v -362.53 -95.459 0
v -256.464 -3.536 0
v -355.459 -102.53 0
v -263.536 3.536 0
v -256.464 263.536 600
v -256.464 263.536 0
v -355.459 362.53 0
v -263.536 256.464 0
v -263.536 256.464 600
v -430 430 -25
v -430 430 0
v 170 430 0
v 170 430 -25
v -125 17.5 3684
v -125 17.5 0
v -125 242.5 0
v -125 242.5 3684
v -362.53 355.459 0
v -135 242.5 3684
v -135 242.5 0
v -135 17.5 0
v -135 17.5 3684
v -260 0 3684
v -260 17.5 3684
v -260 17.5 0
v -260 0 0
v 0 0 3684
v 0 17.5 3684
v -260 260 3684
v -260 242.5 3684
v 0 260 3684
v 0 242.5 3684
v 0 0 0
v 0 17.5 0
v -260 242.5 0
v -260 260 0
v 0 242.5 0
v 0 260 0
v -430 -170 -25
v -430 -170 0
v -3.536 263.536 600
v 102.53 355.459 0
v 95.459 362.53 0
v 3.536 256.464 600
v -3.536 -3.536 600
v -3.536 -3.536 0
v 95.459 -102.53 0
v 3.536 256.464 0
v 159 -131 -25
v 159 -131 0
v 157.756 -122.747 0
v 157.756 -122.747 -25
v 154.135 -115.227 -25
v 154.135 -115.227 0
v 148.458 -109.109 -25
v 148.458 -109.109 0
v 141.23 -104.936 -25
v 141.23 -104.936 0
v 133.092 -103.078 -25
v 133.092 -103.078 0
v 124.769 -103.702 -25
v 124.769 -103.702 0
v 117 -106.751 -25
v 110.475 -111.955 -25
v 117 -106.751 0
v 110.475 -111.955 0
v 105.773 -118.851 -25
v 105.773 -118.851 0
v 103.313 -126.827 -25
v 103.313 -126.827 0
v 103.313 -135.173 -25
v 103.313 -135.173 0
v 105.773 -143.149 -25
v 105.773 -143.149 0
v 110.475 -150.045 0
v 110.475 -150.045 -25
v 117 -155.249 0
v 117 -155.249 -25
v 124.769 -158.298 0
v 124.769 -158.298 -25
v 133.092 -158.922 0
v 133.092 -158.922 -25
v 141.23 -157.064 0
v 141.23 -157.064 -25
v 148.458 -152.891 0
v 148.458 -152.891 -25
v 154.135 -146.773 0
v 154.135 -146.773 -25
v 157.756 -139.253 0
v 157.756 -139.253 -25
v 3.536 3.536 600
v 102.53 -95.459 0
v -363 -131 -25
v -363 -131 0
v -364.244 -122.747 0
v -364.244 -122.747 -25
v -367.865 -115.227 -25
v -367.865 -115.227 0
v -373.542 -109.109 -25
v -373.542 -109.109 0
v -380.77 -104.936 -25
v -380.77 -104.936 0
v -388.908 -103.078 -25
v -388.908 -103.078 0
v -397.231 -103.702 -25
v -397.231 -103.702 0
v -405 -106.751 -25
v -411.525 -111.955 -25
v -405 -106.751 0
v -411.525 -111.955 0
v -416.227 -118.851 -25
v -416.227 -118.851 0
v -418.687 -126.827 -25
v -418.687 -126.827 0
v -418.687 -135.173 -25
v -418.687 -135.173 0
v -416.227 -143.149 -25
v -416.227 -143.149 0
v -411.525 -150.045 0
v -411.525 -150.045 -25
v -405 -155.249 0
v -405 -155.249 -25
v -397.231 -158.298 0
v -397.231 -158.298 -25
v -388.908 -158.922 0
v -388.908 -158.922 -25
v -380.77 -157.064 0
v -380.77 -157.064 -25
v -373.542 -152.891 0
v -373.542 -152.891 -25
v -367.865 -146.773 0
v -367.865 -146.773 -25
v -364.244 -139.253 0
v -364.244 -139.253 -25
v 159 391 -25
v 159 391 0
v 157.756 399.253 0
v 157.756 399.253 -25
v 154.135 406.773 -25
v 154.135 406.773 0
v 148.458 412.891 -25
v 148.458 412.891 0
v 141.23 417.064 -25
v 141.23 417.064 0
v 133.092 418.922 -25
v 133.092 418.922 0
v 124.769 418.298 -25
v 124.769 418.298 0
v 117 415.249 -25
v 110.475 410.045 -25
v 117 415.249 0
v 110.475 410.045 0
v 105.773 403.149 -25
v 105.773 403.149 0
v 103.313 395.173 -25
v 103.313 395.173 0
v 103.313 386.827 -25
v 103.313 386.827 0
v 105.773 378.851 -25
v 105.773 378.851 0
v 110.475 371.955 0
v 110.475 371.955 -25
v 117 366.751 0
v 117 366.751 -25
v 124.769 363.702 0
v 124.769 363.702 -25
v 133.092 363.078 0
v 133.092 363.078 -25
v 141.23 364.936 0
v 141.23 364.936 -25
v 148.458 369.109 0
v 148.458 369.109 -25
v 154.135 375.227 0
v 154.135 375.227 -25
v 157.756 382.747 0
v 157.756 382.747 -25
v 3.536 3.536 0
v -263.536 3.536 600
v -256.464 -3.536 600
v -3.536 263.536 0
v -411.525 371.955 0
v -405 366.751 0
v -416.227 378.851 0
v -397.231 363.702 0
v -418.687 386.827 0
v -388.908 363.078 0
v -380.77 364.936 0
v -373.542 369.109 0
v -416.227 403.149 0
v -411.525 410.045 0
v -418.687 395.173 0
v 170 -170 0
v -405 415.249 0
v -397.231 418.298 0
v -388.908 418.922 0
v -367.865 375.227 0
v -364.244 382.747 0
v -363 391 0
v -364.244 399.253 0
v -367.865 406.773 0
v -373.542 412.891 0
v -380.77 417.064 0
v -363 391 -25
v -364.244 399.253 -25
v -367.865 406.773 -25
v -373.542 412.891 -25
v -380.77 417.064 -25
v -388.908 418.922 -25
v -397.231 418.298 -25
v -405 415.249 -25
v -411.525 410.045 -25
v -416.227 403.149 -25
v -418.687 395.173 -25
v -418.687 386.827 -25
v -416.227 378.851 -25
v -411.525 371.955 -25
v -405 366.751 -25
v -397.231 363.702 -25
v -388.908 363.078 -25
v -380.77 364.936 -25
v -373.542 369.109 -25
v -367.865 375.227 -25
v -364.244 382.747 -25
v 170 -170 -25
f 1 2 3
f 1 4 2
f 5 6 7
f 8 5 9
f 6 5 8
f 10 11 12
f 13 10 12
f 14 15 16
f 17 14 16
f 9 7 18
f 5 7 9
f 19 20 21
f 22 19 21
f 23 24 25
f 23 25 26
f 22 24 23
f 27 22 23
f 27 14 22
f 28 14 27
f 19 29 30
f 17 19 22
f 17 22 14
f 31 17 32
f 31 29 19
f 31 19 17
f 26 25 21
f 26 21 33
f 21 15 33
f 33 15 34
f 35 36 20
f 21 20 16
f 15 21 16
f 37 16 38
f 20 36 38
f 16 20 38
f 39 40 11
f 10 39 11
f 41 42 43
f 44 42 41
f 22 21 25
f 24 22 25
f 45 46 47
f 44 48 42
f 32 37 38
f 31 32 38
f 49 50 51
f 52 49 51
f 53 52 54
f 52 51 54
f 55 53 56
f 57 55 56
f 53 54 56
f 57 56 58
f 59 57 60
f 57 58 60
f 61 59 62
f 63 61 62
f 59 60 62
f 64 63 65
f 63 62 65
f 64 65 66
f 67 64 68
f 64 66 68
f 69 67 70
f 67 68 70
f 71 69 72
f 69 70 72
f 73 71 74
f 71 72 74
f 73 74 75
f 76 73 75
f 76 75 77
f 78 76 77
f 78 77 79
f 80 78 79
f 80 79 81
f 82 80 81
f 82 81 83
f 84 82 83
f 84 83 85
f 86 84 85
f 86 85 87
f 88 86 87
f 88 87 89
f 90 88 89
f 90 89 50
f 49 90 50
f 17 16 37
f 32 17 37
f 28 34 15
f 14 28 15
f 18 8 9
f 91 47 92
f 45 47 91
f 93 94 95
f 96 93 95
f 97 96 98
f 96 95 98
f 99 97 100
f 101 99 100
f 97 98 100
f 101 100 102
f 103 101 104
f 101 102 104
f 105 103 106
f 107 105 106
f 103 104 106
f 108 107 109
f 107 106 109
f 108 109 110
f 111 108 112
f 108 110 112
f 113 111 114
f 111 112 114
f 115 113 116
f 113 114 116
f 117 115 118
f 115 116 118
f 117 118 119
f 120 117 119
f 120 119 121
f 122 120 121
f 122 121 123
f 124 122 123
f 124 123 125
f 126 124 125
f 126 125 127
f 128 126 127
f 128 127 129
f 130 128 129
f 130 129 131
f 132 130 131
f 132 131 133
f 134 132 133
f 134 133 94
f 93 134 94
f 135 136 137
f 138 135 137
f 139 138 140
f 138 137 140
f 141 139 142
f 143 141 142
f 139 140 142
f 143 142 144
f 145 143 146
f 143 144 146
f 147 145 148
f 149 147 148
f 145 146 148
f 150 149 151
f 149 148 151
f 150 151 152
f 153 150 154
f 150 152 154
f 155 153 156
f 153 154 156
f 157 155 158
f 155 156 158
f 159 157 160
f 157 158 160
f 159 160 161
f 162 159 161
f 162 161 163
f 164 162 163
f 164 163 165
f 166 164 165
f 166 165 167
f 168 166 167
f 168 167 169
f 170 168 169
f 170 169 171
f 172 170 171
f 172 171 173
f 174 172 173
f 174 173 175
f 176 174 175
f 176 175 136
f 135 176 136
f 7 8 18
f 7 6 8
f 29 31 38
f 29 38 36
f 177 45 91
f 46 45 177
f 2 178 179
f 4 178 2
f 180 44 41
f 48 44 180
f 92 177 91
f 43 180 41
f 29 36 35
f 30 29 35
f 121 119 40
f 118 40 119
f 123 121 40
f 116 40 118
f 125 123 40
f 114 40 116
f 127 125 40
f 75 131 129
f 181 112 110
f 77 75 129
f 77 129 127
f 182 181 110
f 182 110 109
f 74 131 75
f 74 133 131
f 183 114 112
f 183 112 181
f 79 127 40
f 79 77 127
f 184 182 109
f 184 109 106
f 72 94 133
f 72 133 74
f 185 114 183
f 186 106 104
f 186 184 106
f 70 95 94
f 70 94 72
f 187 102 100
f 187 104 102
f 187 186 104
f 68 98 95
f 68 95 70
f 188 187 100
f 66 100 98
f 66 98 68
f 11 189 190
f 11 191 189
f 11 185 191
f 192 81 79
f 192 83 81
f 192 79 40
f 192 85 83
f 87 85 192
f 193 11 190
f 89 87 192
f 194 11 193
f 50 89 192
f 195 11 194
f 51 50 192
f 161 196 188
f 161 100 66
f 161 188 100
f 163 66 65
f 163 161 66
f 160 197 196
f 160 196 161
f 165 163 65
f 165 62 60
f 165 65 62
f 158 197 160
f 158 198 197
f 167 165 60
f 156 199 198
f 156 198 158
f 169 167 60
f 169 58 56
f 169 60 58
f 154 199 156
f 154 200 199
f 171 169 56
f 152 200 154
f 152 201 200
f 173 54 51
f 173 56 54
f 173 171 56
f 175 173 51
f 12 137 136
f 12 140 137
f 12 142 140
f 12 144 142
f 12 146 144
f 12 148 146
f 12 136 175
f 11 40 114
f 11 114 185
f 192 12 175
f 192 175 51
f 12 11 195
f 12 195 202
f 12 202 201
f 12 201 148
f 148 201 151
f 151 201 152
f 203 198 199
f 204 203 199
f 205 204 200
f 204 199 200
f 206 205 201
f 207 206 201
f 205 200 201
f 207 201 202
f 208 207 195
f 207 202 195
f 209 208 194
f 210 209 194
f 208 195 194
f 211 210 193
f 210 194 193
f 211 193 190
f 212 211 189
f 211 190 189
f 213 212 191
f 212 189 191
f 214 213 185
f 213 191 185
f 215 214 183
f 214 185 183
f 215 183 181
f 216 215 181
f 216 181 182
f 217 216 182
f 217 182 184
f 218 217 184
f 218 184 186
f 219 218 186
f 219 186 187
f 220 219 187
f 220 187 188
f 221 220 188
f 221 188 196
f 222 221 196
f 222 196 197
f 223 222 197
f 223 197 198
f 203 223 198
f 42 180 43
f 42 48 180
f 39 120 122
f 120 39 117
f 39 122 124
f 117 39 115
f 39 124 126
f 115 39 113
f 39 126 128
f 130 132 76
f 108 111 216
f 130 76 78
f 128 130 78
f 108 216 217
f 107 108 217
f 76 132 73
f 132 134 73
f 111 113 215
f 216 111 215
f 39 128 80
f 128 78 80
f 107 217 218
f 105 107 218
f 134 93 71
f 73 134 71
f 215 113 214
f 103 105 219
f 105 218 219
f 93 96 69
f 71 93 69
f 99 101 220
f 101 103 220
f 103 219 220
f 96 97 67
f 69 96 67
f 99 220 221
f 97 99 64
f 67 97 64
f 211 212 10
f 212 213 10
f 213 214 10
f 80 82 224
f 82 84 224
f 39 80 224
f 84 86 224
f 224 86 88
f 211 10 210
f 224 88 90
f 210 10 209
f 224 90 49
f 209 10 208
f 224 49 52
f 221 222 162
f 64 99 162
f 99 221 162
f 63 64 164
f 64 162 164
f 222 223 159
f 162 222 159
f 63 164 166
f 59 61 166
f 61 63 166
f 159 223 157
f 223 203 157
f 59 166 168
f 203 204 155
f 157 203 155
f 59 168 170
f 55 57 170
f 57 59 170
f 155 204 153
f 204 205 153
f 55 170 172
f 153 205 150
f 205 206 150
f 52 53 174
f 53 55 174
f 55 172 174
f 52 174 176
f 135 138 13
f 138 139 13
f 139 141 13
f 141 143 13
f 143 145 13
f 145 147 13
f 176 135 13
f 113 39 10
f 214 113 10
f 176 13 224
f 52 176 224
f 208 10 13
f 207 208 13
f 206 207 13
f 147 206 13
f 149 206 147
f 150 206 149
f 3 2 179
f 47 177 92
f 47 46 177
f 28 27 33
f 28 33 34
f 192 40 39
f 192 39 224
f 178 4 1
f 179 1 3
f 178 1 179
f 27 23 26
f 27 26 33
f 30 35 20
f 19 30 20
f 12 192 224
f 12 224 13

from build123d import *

# Parameters (mm, degrees)
BOSS_EXTRUDE1_DEPTH = 3684
SKETCH3_W           = 600
SKETCH3_H           = 600
BOSS_EXTRUDE2_DEPTH = 25
BOSS_EXTRUDE5_DEPTH = 5
CIRPATTERN3_COUNT   = 4
SKETCH6_R           = 28
CUT_EXTRUDE1_DEPTH  = 3734.852701969


with BuildPart() as part:
    # Sketch1 → Boss-Extrude1 (new body)
    with BuildSketch(Plane.XY):
        Polygon((-125, 242.5), (0, 242.5), (0, 260.0000001), (-260, 260.0000001), (-260, 242.5), (-135, 242.5), (-135, 17.5), (-260, 17.5), (-260, 0), (0, 0), (0, 17.5), (-125, 17.5), align=None)
    extrude(amount=BOSS_EXTRUDE1_DEPTH)


with BuildPart() as body_2:
    # Sketch3 → Boss-Extrude2 (new body)
    with BuildSketch(Plane.XY):
        with Locations((-130, 130)):
            Rectangle(SKETCH3_W, SKETCH3_H)
    extrude(amount=-BOSS_EXTRUDE2_DEPTH)

    # Sketch6 → Cut-Extrude1 (cut, through all)
    with BuildSketch(Plane.XY):
        with Locations((-391, 391)):
            Circle(SKETCH6_R)
        with Locations((131, 391)):
            Circle(SKETCH6_R)
        with Locations((131, -131)):
            Circle(SKETCH6_R)
        with Locations((-391, -131)):
            Circle(SKETCH6_R)
    extrude(amount=-CUT_EXTRUDE1_DEPTH, mode=Mode.SUBTRACT)


with BuildPart() as body_3:
    # Sketch5 → Boss-Extrude5 (new, symmetric)
    with BuildSketch(Plane(origin=(0, 0, 0), x_dir=(0.7071067811865477, -0.7071067811865475, 0), z_dir=(-0.7071067811865475, -0.7071067811865477, 0))):
        Polygon((0, 0), (140, 0), (0, 600), align=None)
    extrude(amount=BOSS_EXTRUDE5_DEPTH, both=True)


with BuildPart() as cirpattern3_1:
    # CirPattern3: pattern copy
    add(body_3.part.rotate(Axis((-130, 130.000000298, 3684), (0, 0, -1)), 1 * 360 / CIRPATTERN3_COUNT))


with BuildPart() as cirpattern3_2:
    # CirPattern3: pattern copy
    add(body_3.part.rotate(Axis((-130, 130.000000298, 3684), (0, 0, -1)), 2 * 360 / CIRPATTERN3_COUNT))


with BuildPart() as cirpattern3_3:
    # CirPattern3: pattern copy
    add(body_3.part.rotate(Axis((-130, 130.000000298, 3684), (0, 0, -1)), 3 * 360 / CIRPATTERN3_COUNT))


solid = Compound([part.part, body_2.part, body_3.part, cirpattern3_1.part, cirpattern3_2.part, cirpattern3_3.part])
